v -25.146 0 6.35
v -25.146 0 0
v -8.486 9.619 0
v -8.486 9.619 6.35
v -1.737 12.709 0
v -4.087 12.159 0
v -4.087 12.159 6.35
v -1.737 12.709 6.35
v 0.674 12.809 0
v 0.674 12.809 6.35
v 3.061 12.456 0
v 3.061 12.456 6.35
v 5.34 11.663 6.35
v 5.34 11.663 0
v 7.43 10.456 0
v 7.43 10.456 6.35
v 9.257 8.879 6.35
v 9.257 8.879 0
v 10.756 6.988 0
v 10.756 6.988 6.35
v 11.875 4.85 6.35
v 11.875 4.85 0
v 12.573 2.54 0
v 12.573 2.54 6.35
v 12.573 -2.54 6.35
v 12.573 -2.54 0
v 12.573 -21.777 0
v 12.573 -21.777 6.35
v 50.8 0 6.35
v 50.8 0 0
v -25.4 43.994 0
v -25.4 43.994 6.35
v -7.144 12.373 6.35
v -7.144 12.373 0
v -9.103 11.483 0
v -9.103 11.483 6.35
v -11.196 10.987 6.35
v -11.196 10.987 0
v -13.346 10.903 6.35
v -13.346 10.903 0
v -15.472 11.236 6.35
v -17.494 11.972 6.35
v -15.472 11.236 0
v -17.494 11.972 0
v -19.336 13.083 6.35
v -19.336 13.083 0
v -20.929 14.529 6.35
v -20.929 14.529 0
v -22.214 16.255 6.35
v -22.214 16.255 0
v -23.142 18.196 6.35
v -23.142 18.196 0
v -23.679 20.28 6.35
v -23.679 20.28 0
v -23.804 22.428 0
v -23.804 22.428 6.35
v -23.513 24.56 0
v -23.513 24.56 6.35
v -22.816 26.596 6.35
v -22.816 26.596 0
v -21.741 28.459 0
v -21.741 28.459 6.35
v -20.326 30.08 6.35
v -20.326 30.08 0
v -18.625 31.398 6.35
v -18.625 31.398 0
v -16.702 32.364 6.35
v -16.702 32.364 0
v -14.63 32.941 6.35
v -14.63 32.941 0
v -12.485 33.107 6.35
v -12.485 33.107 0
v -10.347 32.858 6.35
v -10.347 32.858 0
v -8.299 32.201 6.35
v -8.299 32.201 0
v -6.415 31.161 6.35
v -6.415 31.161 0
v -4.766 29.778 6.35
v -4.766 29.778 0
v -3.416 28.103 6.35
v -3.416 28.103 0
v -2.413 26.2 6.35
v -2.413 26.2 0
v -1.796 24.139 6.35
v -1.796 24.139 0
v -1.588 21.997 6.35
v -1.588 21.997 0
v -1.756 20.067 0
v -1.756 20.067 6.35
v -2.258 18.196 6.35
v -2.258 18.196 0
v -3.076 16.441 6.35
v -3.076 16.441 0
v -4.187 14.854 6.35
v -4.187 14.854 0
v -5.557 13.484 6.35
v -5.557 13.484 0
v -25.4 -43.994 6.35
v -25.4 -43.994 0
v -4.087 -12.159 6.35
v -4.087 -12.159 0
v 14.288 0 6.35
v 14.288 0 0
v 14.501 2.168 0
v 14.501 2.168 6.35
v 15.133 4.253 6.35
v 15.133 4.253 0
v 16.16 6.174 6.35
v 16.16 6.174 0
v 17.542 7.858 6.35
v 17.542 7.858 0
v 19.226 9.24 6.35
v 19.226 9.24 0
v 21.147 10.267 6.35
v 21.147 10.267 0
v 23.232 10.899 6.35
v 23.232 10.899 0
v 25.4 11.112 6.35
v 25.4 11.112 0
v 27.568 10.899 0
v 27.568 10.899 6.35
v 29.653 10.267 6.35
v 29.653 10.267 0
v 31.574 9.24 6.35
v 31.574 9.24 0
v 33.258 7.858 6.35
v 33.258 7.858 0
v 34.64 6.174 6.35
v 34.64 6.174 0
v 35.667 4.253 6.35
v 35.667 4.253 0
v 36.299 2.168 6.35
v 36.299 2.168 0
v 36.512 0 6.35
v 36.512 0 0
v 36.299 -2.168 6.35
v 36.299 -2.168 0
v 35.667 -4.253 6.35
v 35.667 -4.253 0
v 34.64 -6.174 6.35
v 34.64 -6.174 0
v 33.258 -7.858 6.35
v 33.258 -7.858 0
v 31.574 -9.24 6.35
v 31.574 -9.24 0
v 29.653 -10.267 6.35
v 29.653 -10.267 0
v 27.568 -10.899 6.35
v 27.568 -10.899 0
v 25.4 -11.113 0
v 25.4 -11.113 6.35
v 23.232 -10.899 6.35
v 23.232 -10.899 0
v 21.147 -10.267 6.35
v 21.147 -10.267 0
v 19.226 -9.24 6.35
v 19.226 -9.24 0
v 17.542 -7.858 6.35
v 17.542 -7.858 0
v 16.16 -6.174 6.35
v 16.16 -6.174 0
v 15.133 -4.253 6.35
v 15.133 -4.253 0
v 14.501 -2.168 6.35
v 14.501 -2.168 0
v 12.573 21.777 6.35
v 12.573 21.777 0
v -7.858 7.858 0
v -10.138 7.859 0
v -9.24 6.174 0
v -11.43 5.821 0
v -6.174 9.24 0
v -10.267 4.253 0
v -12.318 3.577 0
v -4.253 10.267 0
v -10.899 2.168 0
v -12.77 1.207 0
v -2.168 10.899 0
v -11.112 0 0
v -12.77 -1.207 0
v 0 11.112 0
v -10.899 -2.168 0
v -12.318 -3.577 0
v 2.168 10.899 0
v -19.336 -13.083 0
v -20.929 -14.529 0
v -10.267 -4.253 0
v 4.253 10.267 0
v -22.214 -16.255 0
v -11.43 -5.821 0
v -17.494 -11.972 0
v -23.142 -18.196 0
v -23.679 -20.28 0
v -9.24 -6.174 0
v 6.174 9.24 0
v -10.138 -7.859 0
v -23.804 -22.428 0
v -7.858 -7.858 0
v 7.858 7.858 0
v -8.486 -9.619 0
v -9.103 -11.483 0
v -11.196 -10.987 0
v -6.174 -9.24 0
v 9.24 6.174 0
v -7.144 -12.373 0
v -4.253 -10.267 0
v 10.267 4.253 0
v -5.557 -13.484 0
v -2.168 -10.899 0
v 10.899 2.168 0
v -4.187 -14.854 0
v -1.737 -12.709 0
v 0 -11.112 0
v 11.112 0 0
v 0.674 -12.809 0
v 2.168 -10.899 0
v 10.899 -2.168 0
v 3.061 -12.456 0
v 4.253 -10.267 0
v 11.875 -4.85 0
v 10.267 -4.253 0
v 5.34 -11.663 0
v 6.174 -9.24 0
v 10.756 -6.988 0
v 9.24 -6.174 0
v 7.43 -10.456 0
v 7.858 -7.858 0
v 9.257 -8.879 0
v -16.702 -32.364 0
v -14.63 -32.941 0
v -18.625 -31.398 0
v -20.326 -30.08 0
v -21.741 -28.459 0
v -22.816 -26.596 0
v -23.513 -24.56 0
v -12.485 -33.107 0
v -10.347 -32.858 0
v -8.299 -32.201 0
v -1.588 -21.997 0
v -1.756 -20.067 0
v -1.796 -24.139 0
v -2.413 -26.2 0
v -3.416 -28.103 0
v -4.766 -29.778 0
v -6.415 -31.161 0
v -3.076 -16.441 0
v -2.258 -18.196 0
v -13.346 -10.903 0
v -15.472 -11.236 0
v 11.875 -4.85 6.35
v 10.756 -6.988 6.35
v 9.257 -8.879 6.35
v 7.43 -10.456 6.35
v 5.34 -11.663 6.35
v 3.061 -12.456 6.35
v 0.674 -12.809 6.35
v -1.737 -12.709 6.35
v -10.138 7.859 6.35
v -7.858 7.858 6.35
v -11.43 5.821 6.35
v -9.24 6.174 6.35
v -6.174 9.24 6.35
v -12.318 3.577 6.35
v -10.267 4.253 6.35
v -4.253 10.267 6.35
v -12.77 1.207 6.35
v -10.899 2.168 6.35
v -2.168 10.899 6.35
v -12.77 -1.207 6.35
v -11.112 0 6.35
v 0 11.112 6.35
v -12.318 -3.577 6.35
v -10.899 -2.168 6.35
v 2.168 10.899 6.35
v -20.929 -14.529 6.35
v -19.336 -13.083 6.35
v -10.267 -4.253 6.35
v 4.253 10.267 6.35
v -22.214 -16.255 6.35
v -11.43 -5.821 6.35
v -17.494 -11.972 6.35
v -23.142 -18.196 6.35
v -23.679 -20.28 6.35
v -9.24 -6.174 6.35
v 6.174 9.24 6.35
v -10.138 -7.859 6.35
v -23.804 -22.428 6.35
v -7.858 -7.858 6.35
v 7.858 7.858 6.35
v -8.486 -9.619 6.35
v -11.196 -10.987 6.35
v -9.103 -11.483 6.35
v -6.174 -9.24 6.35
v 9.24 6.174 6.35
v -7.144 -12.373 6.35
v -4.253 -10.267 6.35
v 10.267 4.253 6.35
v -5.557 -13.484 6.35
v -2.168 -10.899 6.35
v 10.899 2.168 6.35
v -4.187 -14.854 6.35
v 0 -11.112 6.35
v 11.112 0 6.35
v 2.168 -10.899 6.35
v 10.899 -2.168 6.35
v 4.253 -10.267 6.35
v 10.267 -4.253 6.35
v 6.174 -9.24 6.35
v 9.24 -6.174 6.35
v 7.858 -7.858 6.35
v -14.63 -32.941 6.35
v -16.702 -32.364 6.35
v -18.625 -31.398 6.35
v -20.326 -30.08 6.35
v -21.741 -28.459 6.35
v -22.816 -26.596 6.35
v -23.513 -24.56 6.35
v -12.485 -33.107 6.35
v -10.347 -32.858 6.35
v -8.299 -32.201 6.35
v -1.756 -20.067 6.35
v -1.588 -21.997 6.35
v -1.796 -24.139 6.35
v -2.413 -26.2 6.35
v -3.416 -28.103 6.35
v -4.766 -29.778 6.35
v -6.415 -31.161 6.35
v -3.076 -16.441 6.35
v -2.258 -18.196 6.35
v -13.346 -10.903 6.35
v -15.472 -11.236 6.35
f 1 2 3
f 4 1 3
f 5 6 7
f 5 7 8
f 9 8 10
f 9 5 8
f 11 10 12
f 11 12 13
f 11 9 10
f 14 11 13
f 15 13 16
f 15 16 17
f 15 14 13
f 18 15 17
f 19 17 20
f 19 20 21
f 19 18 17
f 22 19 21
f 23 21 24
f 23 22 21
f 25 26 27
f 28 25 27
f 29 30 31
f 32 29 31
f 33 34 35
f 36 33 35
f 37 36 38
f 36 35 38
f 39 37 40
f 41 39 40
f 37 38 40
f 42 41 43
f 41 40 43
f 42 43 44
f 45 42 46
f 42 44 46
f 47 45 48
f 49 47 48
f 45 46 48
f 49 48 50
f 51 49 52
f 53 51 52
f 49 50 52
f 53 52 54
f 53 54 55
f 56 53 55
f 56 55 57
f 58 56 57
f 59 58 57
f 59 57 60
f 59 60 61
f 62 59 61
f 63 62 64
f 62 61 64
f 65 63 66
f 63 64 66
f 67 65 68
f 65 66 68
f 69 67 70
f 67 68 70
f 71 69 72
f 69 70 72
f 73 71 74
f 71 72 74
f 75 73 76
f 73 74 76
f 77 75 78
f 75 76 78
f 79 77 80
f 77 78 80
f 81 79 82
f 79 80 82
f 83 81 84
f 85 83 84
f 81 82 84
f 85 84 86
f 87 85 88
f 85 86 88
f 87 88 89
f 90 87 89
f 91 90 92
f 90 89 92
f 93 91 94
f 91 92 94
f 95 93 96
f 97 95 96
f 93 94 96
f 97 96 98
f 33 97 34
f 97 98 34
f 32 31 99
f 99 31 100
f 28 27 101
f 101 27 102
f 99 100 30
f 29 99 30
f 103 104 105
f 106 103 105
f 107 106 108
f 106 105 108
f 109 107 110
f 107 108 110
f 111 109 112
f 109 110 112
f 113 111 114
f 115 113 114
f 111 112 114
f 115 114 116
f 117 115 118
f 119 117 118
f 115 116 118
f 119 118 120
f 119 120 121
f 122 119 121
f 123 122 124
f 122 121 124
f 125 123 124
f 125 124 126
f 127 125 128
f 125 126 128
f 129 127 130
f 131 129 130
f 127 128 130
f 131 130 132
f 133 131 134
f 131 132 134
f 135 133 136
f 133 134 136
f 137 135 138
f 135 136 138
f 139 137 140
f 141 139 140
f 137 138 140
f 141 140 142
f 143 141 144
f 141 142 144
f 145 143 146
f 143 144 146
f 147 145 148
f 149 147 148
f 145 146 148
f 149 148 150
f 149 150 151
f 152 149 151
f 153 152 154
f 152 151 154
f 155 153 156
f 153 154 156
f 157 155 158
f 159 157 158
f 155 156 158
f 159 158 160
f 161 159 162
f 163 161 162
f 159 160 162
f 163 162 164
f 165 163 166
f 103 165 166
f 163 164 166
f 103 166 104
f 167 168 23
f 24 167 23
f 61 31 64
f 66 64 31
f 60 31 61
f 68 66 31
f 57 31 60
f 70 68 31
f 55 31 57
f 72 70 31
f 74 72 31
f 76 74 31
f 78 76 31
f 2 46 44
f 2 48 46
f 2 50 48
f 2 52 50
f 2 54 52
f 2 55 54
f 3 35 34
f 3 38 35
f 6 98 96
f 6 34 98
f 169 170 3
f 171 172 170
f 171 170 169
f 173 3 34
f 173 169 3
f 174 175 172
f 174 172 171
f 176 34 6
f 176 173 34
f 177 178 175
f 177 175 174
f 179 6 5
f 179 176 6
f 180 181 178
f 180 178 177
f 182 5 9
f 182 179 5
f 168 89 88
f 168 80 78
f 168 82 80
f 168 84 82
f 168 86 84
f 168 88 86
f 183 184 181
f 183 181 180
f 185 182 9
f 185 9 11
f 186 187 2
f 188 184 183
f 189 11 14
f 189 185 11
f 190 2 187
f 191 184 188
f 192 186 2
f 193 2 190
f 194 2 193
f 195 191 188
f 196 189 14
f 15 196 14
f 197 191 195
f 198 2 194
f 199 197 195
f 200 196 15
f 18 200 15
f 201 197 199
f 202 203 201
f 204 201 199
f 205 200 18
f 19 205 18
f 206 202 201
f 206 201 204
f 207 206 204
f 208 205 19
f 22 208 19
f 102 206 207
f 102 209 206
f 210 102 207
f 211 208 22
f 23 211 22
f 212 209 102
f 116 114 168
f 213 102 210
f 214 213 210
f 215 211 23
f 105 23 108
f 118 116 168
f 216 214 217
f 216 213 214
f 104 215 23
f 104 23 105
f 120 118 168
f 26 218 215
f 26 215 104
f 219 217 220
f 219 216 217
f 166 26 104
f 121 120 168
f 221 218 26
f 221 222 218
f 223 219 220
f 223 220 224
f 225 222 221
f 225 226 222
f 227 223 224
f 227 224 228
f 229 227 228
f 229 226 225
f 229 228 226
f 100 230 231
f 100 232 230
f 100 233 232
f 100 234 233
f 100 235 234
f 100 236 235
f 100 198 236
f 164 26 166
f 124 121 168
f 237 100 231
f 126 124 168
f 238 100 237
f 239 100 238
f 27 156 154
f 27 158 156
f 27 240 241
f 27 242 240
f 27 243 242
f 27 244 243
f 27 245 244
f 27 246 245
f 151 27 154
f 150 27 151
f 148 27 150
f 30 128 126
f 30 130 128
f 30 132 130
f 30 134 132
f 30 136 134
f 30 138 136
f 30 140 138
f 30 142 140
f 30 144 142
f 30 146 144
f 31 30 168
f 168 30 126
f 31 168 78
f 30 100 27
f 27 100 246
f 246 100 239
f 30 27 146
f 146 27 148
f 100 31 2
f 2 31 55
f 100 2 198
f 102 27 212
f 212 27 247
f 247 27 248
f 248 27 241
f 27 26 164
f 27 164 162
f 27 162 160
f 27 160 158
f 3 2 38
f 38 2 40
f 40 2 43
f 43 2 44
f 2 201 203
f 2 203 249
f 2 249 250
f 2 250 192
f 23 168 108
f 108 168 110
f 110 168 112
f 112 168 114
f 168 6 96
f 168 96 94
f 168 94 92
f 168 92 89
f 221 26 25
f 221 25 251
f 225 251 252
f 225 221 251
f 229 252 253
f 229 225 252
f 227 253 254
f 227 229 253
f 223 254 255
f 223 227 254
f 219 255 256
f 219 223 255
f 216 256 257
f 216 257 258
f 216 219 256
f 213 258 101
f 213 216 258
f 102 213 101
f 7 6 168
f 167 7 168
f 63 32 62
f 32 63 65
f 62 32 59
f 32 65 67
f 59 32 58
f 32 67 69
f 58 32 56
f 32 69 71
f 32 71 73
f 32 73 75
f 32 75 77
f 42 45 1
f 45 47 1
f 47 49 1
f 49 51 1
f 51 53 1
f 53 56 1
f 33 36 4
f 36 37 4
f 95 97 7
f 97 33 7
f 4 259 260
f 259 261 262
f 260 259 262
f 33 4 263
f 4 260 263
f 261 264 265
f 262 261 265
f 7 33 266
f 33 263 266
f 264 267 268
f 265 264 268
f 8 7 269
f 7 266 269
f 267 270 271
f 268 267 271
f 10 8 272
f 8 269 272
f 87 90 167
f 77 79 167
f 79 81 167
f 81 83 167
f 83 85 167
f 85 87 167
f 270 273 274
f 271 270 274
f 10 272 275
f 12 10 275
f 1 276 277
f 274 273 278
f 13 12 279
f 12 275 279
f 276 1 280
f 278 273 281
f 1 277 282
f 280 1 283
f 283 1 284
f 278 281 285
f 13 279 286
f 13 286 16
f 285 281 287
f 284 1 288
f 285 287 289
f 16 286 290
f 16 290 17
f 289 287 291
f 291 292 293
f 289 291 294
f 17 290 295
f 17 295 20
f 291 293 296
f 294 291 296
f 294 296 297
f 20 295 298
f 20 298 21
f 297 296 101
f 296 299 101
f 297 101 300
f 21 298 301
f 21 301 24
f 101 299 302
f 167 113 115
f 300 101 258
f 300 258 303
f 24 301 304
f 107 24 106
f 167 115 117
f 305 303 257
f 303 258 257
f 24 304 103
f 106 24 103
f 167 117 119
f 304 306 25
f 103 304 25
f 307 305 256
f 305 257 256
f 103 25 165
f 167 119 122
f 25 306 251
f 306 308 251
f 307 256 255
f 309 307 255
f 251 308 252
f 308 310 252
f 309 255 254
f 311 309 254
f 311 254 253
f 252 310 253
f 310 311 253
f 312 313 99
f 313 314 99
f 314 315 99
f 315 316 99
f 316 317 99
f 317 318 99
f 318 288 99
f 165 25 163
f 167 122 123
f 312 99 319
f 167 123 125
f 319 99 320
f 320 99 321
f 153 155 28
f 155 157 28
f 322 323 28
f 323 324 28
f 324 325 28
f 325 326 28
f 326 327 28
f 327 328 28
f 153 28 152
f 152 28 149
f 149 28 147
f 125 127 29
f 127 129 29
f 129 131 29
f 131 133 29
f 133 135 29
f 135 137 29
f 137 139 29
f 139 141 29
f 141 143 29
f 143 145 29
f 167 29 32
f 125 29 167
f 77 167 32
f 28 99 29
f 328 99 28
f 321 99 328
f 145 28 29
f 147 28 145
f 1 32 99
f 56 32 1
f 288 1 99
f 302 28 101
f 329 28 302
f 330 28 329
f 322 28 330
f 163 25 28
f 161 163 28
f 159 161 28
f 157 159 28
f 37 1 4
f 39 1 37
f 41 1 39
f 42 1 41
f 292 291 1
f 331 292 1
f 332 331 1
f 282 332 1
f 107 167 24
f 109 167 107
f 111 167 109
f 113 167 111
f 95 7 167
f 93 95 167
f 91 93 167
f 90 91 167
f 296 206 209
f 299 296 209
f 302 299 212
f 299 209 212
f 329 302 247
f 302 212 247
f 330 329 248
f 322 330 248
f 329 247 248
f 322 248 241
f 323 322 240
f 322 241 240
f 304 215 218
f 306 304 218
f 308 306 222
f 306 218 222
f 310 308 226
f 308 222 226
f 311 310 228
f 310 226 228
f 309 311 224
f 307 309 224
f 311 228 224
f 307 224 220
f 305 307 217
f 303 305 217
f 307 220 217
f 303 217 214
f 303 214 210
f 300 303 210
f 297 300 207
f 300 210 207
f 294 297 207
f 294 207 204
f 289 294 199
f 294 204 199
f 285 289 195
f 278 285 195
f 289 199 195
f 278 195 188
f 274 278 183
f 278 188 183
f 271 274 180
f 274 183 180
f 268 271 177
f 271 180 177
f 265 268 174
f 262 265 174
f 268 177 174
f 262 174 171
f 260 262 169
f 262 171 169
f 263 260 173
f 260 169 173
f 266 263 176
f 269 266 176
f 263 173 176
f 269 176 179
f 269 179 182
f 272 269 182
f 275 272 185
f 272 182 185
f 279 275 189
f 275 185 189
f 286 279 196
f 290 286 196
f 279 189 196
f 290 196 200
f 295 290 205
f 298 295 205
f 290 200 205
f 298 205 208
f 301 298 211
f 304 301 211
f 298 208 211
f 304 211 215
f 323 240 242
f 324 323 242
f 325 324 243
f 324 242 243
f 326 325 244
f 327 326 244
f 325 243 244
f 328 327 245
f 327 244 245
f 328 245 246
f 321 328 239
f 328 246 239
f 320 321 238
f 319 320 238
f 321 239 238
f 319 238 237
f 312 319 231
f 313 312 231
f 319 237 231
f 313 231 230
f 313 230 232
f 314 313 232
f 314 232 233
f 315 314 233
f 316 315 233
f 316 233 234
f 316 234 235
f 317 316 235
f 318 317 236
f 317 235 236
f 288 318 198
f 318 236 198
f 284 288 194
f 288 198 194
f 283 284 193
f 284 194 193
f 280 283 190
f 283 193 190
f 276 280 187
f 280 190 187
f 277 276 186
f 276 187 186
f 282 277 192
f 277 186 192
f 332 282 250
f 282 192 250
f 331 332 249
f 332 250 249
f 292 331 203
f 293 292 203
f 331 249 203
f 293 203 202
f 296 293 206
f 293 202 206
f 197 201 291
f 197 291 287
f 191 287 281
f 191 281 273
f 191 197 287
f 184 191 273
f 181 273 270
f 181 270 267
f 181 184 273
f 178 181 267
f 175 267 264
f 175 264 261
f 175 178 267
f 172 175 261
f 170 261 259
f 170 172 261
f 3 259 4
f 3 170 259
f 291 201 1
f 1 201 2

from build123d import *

# Parameters (mm, degrees)
F1_DEPTH = 6.35
F3_DEPTH = 1.27
F5_DEPTH = 6.35
F6_R     = 12.827
F6_R_2   = 11.1125
F7_DEPTH = 6.35


with BuildPart() as f1:
    # F0 (on Top) → F1 (new body)
    with BuildSketch(Plane.XY):
        Polygon((50.8, 0), (12.7, 21.9970452561), (12.7, 0), (12.7, -21.9970452561), align=None)
        with BuildLine():
            ThreePointArc((36.5125, 0), (25.4, -11.1125), (14.2875, 0))
            ThreePointArc((14.2875, 0), (25.4, 11.1125), (36.5125, 0))
        make_face(mode=Mode.SUBTRACT)
        with BuildLine():
            Line((12.7, 0), (12.7, 21.9970452561))
            Line((12.7, 21.9970452561), (-6.35, 10.9985226281))
            Line((-6.35, 10.9985226281), (-5.55625, 9.6237072996))
            ThreePointArc((-5.55625, 9.6237072996), (5.55625, 9.6237072996), (11.1125, 0))
            Line((11.1125, 0), (12.7, 0))
        make_face()
        Polygon((-6.35, 10.9985226281), (12.7, 21.9970452561), (-25.4, 43.9940905122), (-25.4, 0), align=None)
        with BuildLine():
            ThreePointArc((-1.5875, 21.9970452561), (-3.0762927004, 16.4407952561), (-7.14375, 12.3733379566))
            ThreePointArc((-7.14375, 12.3733379566), (-22.3237072996, 27.5532952561), (-1.5875, 21.9970452561))
        make_face(mode=Mode.SUBTRACT)
        with BuildLine():
            Line((12.7, -21.9970452561), (12.7, 0))
            Line((12.7, 0), (11.1125, 0))
            ThreePointArc((11.1125, 0), (5.55625, -9.6237072996), (-5.55625, -9.6237072996))
            Line((-5.55625, -9.6237072996), (-6.35, -10.9985226281))
            Line((-6.35, -10.9985226281), (12.7, -21.9970452561))
        make_face()
        with BuildLine():
            Line((-5.55625, 9.6237072996), (-6.35, 10.9985226281))
            Line((-6.35, 10.9985226281), (-25.4, 0))
            Line((-25.4, 0), (-6.35, -10.9985226281))
            Line((-6.35, -10.9985226281), (-5.55625, -9.6237072996))
            ThreePointArc((-5.55625, -9.6237072996), (-11.1125, 0), (-5.55625, 9.6237072996))
        make_face()
        Polygon((-25.4, -43.9940905122), (12.7, -21.9970452561), (-6.35, -10.9985226281), (-25.4, 0), align=None)
        with BuildLine():
            ThreePointArc((-1.5875, -21.9970452561), (-22.3237072996, -27.5532952561), (-7.14375, -12.3733379566))
            ThreePointArc((-7.14375, -12.3733379566), (-3.0762927004, -16.4407952561), (-1.5875, -21.9970452561))
        make_face(mode=Mode.SUBTRACT)
    extrude(amount=F1_DEPTH)

    # F2 (on face) → F3 (cut)
    with BuildSketch(Plane.XY.offset(6.35)):
        Polygon((12.573, -21.7770748036), (12.573, 21.7770748036), (-25.146, 0), align=None)
        Polygon((-22.8768289089, 0), (11.4384144545, 19.8119149932), (11.4384144545, -19.8119149932), align=None, mode=Mode.SUBTRACT)
    extrude(amount=-F3_DEPTH, mode=Mode.SUBTRACT)

    # F4 (on face) → F5 (cut)
    with BuildSketch(Plane(origin=(0, 0, 0), x_dir=(1, 0, 0), z_dir=(0, 0, -1))):
        with BuildLine():
            Line((12.573, 2.54), (12.573, 21.7770748036))
            Line((12.573, 21.7770748036), (-4.0867954744, 12.1585374018))
            ThreePointArc((-4.0867954744, 12.1585374018), (6.4135, 11.1085078543), (12.573, 2.54))
        make_face()
        with BuildLine():
            ThreePointArc((12.827, 0), (12.7633420388, 1.2763342039), (12.573, 2.54))
            Line((12.573, 2.54), (12.573, -2.54))
            ThreePointArc((12.573, -2.54), (12.7633420388, -1.2763342039), (12.827, 0))
        make_face()
        with BuildLine():
            Line((12.573, -2.54), (12.573, 2.54))
            ThreePointArc((12.573, 2.54), (6.4135, 11.1085078543), (-4.0867954744, 12.1585374018))
            Line((-4.0867954744, 12.1585374018), (-8.4862045256, 9.6185374018))
            ThreePointArc((-8.4862045256, 9.6185374018), (-12.827, 0), (-8.4862045256, -9.6185374018))
            Line((-8.4862045256, -9.6185374018), (-4.0867954744, -12.1585374018))
            ThreePointArc((-4.0867954744, -12.1585374018), (6.4135, -11.1085078543), (12.573, -2.54))
        make_face()
        with BuildLine():
            Line((-8.4862045256, 9.6185374018), (-4.0867954744, 12.1585374018))
            ThreePointArc((-4.0867954744, 12.1585374018), (-6.4135, 11.1085078543), (-8.4862045256, 9.6185374018))
        make_face()
        with BuildLine():
            Line((12.573, -21.7770748036), (12.573, -2.54))
            ThreePointArc((12.573, -2.54), (6.4135, -11.1085078543), (-4.0867954744, -12.1585374018))
            Line((-4.0867954744, -12.1585374018), (12.573, -21.7770748036))
        make_face()
        with BuildLine():
            ThreePointArc((-8.4862045256, -9.6185374018), (-12.827, 0), (-8.4862045256, 9.6185374018))
            Line((-8.4862045256, 9.6185374018), (-25.146, 0))
            Line((-25.146, 0), (-8.4862045256, -9.6185374018))
        make_face()
        with BuildLine():
            ThreePointArc((-8.4862045256, -9.6185374018), (-6.4135, -11.1085078543), (-4.0867954744, -12.1585374018))
            Line((-4.0867954744, -12.1585374018), (-8.4862045256, -9.6185374018))
        make_face()
    extrude(amount=-F5_DEPTH, mode=Mode.SUBTRACT)

    # F6 (on face) → F7 (join)
    with BuildSketch(Plane(origin=(0, 0, 0), x_dir=(1, 0, 0), z_dir=(0, 0, -1))):
        Circle(F6_R)
        Circle(F6_R_2, mode=Mode.SUBTRACT)
    extrude(amount=-F7_DEPTH)


solid = f1.part
